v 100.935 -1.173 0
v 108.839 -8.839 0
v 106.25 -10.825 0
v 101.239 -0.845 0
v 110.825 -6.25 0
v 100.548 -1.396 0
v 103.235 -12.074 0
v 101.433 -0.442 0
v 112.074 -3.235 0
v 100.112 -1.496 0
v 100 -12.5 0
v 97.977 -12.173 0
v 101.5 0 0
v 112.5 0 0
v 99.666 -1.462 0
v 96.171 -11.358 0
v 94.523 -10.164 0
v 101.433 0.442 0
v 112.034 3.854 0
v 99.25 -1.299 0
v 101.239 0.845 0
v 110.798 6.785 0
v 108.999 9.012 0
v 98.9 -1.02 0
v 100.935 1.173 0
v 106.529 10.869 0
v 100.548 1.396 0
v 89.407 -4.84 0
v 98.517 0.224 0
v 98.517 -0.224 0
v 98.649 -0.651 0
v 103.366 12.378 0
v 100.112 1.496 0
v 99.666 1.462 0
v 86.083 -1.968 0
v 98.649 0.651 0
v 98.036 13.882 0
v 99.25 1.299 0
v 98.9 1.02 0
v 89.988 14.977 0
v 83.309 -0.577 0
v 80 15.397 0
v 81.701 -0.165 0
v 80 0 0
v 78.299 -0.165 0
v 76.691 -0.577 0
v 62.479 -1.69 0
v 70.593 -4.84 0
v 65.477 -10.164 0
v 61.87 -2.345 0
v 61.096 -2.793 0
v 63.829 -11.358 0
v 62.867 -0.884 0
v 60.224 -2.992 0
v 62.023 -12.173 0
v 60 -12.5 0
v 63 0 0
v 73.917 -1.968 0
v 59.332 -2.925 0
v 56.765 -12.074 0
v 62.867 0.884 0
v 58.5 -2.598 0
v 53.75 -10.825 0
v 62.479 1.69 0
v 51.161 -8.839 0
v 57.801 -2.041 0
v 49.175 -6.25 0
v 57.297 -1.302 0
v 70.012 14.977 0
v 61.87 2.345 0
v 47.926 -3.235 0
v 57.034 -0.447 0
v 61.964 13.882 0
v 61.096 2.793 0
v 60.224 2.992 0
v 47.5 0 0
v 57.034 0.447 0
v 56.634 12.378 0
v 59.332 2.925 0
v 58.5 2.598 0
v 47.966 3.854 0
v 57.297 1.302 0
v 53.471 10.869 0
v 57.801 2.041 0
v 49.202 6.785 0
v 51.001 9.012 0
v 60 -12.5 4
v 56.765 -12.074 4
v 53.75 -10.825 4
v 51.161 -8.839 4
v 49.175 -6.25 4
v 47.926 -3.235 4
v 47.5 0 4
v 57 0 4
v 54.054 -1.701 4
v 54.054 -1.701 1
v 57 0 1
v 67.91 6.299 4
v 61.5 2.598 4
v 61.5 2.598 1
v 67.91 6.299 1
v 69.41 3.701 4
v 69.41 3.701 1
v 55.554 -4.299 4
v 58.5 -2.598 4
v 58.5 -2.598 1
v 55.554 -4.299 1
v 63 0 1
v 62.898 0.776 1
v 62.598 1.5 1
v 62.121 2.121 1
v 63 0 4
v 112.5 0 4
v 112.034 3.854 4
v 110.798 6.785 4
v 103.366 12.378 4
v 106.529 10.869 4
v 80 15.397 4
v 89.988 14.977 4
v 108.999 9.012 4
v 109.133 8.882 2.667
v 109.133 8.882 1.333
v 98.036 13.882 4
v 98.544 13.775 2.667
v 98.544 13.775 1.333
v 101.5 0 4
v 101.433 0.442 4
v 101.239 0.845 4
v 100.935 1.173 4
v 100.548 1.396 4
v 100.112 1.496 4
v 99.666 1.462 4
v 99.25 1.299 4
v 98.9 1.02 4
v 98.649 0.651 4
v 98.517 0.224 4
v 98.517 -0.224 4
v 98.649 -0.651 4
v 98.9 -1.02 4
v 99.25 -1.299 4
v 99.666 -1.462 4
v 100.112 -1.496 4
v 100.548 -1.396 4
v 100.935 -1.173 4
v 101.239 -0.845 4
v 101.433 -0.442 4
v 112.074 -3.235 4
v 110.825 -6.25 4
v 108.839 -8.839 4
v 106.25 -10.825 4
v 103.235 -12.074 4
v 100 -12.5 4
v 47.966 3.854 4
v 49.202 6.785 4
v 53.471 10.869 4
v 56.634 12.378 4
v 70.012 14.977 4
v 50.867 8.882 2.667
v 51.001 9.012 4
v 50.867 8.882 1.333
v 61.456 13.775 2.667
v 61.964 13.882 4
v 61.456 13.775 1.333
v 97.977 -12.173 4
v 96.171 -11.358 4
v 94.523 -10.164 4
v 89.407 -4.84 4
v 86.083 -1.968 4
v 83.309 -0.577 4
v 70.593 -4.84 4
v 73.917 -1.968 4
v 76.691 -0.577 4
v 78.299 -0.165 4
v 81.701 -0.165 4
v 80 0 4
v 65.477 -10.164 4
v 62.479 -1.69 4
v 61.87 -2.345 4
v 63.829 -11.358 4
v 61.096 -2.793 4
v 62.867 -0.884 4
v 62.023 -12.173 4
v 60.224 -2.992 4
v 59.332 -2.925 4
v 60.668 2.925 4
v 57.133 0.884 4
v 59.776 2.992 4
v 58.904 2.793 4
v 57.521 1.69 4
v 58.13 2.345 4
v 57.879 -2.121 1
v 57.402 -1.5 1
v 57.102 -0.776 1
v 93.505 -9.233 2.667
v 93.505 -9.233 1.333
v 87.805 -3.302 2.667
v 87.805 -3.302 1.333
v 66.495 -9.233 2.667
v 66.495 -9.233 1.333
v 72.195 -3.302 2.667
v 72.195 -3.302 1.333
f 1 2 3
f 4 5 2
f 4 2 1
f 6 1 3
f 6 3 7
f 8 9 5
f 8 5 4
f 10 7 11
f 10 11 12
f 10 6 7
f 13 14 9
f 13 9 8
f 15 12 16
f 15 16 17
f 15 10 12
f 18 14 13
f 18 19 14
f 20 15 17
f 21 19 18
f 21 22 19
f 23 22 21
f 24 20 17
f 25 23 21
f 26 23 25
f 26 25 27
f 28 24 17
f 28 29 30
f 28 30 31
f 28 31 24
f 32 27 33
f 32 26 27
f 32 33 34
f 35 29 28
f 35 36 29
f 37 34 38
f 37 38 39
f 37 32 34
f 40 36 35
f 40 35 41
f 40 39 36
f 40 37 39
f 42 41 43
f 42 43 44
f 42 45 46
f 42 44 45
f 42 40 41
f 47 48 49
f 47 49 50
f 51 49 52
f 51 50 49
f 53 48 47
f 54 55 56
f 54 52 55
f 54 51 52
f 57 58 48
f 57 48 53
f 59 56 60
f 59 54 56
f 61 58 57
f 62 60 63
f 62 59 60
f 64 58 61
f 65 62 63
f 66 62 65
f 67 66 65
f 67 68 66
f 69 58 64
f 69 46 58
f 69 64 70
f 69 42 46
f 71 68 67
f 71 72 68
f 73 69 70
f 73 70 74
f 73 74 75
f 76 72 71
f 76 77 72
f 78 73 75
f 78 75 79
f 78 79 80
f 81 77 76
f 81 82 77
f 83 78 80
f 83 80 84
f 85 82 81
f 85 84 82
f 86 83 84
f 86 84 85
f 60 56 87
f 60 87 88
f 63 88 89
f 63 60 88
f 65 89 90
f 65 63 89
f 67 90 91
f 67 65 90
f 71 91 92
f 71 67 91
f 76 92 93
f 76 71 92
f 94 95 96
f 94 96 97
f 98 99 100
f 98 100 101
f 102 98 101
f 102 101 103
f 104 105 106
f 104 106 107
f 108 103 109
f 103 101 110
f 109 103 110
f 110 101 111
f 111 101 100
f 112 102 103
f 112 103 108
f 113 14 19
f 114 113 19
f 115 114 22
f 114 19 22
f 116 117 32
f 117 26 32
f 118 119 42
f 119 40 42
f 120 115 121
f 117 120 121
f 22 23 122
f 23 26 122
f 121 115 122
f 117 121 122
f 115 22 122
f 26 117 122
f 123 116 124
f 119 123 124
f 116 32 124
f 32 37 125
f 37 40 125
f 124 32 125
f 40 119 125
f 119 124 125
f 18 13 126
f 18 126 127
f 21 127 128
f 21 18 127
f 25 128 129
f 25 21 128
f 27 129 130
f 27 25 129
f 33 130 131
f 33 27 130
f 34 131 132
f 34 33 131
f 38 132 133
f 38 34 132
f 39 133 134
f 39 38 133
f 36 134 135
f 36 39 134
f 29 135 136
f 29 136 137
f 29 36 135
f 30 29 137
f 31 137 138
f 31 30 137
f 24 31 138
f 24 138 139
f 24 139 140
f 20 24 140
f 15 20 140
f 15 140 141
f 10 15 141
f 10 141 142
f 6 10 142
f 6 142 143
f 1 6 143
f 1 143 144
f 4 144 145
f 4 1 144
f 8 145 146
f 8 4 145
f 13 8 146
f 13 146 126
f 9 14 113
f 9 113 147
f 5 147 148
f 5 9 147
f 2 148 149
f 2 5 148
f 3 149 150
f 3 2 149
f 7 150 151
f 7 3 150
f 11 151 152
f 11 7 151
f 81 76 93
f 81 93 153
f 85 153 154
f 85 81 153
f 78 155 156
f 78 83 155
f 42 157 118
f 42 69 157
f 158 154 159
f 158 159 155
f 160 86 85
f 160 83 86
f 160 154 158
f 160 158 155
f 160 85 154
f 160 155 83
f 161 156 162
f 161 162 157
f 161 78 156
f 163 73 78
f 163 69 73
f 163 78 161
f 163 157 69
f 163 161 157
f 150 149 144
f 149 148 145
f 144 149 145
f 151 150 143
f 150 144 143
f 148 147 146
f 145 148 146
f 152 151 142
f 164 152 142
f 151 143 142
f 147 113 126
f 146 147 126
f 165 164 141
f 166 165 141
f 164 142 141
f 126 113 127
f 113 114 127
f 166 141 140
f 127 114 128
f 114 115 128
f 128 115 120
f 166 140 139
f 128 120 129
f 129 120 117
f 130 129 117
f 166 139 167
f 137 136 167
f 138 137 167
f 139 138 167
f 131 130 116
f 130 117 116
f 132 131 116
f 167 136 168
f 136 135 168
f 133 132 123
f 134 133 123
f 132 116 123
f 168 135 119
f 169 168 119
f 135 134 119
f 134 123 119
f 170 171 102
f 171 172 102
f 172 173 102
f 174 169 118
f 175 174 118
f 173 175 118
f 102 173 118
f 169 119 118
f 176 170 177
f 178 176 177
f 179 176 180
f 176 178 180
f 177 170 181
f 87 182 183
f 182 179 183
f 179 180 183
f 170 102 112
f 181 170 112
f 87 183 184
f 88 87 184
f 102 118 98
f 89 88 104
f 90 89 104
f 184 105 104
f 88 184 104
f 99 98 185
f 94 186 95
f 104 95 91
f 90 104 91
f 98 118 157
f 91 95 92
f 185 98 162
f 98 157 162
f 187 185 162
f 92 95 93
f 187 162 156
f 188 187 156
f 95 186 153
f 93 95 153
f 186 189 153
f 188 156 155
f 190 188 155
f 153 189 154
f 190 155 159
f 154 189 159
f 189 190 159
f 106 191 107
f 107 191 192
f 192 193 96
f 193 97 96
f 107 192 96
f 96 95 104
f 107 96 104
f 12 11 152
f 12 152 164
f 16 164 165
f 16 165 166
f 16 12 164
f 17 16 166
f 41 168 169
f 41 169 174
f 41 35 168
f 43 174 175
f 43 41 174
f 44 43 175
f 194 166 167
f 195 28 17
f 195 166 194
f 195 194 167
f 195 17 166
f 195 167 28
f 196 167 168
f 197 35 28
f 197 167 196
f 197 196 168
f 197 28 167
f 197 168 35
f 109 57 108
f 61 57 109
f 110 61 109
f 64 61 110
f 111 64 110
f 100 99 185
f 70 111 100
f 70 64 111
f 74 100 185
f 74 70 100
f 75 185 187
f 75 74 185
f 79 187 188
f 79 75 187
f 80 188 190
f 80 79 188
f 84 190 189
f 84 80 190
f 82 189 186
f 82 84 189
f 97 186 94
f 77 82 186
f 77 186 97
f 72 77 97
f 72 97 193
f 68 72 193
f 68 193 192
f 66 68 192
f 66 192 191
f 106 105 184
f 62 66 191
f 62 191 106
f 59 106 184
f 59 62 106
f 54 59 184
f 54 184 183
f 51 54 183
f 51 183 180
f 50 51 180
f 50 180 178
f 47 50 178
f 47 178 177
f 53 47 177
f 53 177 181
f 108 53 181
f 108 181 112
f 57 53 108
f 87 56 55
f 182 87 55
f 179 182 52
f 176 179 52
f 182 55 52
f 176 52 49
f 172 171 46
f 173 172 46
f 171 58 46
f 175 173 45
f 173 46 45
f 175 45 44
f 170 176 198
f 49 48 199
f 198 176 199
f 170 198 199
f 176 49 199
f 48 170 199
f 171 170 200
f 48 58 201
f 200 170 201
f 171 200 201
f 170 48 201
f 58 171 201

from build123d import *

# Parameters (mm, degrees)
SKETCH_1_R          = 1.5
SKETCH_1_R_2        = 3
EXTRUDE_1_DEPTH     = 4
CUT_EXTRUDE_2_DEPTH = 3


with BuildPart() as part:
    # 草图1 → 凸台-拉伸1 (new body)
    with BuildSketch(Plane.XY):
        with BuildLine():
            ThreePointArc((112.5, 0), (108.838834765, -8.838834765), (100, -12.5))
            add(Edge.make_bspline(
                [(100, -12.5), (92.140208688, -12.329014368), (89.825172612, -0.222632889), (80, 0)],
                knots=[0, 0, 0, 0, 1, 1, 1, 1], degree=3))
            add(Edge.make_bspline(
                [(60, -12.5), (67.859791312, -12.329014368), (70.174827388, -0.222632889), (80, 0)],
                knots=[0, 0, 0, 0, 1, 1, 1, 1], degree=3))
            ThreePointArc((60, -12.5), (51.161165235, -8.838834765), (47.5, 0))
            add(Edge.make_bspline(
                [(47.5, 0), (47.5, 11.115830806), (57.235300252, 15.170917893), (80, 15.396531985)],
                knots=[0, 0, 0, 0, 1, 1, 1, 1], degree=3))
            add(Edge.make_bspline(
                [(112.5, 0), (112.5, 11.115830806), (102.764699748, 15.170917893), (80, 15.396531985)],
                knots=[0, 0, 0, 0, 1, 1, 1, 1], degree=3))
        make_face()
        with Locations((100, 0)):
            Circle(SKETCH_1_R, mode=Mode.SUBTRACT)
        with Locations((60, 0)):
            Circle(SKETCH_1_R_2, mode=Mode.SUBTRACT)
    extrude(amount=EXTRUDE_1_DEPTH)

    # 草图5 → 切除-拉伸2 (cut)
    with BuildSketch(Plane.XY.offset(4)):
        Polygon((54.803847577, -3), (54.053847577, -1.700961894), (67.910254038, 6.299038106), (69.410254038, 3.700961894), (55.553847577, -4.299038106), align=None)
    extrude(amount=-CUT_EXTRUDE_2_DEPTH, mode=Mode.SUBTRACT)


solid = part.part
